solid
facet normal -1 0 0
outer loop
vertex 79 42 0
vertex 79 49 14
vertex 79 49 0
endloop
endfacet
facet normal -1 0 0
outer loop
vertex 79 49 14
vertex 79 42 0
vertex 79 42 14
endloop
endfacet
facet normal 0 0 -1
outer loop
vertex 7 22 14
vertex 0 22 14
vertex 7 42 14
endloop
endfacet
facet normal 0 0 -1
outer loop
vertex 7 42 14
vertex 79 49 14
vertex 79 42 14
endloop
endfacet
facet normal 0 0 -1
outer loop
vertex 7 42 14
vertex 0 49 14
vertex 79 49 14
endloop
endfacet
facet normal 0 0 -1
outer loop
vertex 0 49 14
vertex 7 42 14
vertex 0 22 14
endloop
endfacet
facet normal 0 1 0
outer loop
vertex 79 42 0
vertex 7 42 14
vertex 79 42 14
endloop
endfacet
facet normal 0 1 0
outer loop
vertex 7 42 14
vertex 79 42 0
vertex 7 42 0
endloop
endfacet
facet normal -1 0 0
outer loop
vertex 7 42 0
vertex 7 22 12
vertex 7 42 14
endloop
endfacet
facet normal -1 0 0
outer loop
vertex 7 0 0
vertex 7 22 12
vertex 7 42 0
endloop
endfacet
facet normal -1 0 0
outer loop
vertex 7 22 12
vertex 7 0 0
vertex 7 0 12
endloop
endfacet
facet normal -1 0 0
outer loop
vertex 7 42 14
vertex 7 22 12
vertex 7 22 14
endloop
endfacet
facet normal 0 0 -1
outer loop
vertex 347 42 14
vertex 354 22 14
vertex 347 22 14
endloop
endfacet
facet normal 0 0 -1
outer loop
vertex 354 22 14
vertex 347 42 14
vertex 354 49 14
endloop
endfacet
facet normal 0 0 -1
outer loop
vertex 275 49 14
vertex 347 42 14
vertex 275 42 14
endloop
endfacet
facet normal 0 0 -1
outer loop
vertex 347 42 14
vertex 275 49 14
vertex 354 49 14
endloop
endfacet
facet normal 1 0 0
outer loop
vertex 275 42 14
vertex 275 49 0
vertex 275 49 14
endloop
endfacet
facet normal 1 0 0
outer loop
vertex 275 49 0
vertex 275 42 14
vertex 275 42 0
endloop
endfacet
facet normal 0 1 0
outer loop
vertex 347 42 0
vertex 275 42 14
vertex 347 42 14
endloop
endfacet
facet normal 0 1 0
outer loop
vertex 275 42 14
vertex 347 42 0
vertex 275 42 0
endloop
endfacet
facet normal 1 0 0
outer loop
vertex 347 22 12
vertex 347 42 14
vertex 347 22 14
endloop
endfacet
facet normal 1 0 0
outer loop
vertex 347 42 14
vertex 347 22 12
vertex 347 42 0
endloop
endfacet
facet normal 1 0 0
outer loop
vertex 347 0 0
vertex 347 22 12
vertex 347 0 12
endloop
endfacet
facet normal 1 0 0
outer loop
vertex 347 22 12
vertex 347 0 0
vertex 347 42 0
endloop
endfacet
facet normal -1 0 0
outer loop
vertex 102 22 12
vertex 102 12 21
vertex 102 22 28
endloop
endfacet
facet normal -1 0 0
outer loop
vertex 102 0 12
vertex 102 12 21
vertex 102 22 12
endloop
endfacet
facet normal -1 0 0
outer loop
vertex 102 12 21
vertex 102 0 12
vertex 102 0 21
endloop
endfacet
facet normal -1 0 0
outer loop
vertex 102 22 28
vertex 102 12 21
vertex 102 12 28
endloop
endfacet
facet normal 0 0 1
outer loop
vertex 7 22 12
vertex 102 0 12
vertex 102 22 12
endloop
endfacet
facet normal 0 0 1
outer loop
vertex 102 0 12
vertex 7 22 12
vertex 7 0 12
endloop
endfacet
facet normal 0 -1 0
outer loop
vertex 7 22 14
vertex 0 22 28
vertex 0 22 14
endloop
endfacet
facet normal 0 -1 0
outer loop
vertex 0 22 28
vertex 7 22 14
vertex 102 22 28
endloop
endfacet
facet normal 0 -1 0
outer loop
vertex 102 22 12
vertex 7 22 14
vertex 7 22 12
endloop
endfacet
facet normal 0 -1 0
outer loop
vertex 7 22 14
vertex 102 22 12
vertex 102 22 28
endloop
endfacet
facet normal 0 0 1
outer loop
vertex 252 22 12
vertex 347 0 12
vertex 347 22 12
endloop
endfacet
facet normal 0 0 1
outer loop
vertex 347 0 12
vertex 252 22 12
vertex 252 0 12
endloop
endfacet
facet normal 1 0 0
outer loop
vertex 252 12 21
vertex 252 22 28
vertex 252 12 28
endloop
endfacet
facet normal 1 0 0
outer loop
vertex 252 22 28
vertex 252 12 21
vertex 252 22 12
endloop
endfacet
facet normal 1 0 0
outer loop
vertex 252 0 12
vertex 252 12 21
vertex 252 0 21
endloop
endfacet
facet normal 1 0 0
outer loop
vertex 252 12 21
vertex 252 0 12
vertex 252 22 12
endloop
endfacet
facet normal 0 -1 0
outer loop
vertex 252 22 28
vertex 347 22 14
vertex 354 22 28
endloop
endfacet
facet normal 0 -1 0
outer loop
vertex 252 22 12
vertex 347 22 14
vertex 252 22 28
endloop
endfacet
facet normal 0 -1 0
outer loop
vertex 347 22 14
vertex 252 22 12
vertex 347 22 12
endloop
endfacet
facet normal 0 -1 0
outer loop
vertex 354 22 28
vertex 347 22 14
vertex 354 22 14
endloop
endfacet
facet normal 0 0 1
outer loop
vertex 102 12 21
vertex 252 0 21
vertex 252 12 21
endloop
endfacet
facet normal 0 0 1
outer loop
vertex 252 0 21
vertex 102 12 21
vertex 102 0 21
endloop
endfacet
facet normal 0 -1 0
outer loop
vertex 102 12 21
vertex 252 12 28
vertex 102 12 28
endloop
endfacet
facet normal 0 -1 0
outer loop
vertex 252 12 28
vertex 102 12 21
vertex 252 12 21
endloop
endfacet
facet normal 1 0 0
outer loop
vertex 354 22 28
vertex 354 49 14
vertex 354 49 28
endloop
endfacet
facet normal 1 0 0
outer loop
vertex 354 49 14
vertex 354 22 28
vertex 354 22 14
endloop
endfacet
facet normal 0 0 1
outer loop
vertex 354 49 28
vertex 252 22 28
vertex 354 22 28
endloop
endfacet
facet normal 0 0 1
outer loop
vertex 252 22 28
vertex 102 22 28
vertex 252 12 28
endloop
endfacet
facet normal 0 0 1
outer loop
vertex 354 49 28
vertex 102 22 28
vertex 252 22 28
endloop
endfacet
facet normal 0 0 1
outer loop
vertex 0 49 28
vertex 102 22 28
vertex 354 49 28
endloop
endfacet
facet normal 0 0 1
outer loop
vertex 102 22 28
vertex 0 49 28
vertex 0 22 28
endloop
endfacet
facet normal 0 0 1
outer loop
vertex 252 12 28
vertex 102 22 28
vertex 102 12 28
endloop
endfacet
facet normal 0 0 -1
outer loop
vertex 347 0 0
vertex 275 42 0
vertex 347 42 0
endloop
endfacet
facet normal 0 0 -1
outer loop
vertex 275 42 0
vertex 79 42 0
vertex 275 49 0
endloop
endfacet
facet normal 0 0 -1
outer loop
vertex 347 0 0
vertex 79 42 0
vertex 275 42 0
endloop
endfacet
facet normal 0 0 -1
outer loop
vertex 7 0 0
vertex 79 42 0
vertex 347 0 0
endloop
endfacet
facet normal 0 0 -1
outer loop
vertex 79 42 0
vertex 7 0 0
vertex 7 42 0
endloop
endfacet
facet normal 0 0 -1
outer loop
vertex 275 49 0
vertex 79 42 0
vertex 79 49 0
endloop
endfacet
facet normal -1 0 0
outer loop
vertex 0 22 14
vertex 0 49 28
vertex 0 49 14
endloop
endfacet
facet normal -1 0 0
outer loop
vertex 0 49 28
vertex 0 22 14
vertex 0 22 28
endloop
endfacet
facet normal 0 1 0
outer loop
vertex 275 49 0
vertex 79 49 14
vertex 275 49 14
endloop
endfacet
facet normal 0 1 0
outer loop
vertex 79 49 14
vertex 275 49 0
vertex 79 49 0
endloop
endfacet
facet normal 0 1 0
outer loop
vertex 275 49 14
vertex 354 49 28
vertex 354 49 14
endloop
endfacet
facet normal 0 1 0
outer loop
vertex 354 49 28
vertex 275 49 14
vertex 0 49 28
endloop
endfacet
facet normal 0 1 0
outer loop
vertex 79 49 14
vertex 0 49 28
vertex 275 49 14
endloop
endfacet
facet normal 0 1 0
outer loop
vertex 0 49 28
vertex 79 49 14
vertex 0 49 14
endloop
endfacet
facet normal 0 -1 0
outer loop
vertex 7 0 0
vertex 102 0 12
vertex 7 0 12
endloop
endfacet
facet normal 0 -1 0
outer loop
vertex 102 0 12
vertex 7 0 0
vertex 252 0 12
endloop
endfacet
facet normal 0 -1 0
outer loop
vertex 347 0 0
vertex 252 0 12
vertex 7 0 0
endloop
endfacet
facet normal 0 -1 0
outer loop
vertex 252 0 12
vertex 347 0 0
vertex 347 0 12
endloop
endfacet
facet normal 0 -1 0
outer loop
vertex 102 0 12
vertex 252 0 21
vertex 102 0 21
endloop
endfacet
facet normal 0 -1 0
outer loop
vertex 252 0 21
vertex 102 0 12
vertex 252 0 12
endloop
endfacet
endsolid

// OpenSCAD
include <../src/wardrobe.scad>;
plank_xy_top(wardrobe_n);
//github_openscad -o wardrobe_3/plank_xy_top.stl -D wardrobe_n=3 -D cutting_edge=0 -D break_view_length=0 wardrobe_3/plank_xy_top_stl.scad
